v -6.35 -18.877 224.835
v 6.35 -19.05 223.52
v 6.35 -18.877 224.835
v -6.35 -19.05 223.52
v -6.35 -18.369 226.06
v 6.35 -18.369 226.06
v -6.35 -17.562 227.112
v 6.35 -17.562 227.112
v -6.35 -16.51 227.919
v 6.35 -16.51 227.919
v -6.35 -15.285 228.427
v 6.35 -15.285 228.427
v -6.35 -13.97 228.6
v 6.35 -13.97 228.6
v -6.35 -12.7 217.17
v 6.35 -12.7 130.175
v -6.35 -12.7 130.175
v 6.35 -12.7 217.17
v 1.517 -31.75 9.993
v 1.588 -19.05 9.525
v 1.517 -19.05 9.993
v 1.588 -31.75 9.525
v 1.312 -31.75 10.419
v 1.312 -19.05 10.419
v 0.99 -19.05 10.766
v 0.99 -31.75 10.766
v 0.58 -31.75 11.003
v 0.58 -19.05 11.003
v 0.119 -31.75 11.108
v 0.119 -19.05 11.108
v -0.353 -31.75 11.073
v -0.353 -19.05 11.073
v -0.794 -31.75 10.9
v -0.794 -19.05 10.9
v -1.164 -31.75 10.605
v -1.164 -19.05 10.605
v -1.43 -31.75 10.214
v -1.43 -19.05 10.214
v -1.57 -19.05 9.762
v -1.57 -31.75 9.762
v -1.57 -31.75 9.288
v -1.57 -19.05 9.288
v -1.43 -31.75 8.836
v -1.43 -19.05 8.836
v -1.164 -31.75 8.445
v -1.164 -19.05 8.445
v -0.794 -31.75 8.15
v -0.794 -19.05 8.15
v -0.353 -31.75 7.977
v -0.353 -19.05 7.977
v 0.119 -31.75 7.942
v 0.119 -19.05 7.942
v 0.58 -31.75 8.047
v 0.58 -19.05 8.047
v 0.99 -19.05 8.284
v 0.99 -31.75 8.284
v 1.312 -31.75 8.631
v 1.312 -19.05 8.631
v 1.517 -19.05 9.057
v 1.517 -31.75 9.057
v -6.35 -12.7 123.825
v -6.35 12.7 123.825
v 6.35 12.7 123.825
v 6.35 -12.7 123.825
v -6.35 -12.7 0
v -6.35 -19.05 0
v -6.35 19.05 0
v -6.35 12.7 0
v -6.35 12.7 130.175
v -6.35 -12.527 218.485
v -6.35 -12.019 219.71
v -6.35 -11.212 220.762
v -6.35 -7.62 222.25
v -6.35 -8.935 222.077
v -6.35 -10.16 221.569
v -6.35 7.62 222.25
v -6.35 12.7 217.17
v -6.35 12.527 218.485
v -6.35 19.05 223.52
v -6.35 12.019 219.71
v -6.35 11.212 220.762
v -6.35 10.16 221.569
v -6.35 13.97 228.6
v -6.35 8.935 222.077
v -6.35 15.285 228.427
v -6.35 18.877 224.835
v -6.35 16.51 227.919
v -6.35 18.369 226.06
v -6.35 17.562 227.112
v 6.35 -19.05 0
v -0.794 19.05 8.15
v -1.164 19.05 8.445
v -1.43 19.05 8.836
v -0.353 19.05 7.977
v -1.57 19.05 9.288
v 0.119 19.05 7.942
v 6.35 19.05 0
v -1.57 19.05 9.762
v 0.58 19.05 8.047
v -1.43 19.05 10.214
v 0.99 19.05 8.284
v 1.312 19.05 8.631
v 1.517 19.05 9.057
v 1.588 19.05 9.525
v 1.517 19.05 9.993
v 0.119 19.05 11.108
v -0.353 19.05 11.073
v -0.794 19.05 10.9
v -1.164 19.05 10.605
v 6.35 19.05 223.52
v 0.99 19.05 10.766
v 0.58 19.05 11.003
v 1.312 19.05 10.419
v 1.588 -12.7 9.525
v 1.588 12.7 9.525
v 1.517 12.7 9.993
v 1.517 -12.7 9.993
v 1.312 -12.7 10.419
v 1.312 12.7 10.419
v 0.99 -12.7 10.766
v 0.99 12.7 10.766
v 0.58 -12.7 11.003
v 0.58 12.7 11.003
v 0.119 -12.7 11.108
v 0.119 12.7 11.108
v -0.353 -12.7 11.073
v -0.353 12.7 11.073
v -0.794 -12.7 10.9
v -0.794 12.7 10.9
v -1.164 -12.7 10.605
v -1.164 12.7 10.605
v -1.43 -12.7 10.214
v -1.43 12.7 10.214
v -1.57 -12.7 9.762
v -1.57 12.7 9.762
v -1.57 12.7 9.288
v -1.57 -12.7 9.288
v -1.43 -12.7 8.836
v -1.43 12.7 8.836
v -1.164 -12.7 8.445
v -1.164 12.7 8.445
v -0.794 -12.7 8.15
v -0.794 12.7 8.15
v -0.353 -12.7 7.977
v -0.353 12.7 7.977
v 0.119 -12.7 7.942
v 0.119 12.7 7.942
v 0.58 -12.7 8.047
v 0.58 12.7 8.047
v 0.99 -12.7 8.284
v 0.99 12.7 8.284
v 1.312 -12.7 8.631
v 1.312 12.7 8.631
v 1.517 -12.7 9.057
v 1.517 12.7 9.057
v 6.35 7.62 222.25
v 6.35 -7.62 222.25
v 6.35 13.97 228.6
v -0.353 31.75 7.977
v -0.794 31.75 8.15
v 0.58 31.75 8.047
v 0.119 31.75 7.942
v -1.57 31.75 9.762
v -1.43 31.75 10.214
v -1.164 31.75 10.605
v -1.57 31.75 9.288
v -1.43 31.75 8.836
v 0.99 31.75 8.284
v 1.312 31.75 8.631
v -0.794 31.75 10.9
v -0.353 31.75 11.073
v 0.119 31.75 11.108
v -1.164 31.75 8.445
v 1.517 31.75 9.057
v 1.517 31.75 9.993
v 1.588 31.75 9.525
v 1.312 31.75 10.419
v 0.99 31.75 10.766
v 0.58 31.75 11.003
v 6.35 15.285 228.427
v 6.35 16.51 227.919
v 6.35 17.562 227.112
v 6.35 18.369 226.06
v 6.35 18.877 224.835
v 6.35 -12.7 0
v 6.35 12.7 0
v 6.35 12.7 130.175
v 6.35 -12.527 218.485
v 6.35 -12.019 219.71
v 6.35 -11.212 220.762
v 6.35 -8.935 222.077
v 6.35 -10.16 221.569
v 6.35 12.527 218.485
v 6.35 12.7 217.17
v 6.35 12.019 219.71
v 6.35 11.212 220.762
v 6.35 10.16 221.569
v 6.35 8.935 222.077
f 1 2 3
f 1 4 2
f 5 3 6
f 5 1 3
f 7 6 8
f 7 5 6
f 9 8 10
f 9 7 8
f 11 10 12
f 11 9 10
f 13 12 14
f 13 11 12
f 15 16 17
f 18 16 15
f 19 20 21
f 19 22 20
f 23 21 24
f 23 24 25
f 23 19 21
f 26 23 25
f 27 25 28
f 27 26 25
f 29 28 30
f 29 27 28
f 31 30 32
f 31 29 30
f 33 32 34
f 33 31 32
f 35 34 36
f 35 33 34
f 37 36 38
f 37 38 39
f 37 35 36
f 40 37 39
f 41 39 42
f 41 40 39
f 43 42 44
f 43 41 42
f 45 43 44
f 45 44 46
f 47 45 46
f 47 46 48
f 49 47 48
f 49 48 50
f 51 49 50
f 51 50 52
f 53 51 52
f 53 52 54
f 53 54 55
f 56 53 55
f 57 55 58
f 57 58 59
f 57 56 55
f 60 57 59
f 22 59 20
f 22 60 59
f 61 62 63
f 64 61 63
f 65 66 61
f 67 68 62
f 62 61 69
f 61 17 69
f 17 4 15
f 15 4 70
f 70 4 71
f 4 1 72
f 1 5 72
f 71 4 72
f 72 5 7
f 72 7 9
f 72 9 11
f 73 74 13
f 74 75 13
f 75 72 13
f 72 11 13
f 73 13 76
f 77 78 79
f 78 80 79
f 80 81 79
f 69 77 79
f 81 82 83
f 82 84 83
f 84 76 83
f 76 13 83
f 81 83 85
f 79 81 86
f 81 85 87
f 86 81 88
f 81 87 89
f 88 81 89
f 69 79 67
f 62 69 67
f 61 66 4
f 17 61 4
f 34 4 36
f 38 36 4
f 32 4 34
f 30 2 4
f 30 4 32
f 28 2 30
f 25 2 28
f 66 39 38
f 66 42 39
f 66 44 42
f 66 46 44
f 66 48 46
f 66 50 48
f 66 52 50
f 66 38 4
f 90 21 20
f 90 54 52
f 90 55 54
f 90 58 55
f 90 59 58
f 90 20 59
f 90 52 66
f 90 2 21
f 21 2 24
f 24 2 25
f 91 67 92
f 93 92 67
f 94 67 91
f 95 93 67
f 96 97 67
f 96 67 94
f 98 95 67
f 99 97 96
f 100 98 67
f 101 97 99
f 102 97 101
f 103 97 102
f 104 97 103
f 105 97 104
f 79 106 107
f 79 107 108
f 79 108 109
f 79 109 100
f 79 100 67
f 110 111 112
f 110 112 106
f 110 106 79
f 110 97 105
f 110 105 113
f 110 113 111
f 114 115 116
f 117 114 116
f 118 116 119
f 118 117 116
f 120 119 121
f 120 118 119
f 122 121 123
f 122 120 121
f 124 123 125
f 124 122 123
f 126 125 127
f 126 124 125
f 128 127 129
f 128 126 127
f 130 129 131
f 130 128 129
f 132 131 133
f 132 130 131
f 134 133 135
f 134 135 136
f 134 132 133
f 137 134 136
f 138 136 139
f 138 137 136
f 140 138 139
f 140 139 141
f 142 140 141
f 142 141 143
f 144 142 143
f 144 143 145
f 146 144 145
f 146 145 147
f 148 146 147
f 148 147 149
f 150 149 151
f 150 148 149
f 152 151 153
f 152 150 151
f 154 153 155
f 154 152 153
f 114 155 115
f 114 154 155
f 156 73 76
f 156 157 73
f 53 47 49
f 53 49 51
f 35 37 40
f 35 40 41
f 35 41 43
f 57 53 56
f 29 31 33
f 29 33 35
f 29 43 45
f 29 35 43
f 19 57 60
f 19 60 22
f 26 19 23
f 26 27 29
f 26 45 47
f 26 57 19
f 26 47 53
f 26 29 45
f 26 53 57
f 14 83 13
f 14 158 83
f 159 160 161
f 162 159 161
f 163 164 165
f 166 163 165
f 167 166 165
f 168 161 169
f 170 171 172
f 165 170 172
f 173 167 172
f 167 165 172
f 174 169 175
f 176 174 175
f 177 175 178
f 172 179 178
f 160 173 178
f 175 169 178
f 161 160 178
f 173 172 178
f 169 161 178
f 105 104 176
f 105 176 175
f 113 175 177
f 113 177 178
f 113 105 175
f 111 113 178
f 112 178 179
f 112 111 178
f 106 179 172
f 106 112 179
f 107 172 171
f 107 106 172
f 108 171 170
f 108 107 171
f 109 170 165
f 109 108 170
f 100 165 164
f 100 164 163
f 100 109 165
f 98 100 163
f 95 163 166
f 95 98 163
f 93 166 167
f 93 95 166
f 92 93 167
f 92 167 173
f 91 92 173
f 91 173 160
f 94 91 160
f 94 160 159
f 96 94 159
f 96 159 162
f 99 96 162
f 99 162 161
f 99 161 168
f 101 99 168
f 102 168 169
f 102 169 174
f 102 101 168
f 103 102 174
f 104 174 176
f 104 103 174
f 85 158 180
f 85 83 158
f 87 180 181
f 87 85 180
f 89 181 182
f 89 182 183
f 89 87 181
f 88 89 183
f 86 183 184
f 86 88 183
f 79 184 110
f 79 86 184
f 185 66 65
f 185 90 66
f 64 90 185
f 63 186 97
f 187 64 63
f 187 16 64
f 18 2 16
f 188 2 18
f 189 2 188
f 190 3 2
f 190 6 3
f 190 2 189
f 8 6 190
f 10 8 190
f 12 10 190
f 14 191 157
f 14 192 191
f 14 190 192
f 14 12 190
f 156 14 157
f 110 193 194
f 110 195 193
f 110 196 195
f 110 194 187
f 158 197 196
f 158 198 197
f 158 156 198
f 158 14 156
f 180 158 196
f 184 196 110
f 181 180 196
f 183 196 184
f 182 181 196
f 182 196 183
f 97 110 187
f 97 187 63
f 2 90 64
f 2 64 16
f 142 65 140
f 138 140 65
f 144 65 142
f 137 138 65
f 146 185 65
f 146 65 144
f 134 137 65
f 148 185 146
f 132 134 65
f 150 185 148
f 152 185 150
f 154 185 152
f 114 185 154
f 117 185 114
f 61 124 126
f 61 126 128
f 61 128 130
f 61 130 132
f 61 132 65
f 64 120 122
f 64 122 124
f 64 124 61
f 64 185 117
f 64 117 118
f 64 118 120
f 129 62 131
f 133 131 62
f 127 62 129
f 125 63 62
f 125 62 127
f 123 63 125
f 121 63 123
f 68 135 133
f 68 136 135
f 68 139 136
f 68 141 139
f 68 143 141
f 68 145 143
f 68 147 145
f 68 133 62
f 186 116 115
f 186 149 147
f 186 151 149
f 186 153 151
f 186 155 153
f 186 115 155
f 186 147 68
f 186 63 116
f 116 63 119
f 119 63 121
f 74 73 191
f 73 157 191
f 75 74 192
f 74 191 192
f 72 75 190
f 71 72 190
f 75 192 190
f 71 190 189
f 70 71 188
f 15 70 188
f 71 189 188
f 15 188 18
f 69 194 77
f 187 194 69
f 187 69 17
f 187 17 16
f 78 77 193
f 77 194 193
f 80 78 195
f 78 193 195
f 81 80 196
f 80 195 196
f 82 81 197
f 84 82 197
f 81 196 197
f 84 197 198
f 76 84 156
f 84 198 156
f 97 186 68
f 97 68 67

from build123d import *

# Parameters (mm, degrees)
F1_DEPTH = 6.35
F2_R     = 5.08
F3_W     = 12.7
F3_H     = 6.35
F4_DEPTH = 12.7
F3_R     = 1.5875
F5_DEPTH = 127
F6_DEPTH = 31.75


with BuildPart() as f1:
    # F0 (on Right) → F1 (new body, symmetric)
    with BuildSketch(Plane.YZ):
        Polygon((-19.05, 0), (-12.7, 0), (-12.7, 222.25), (12.7, 222.25), (12.7, 0), (19.05, 0), (19.05, 228.6), (12.7, 228.6), (-12.7, 228.6), (-19.05, 228.6), align=None)
    extrude(amount=F1_DEPTH, both=True)

    # F2
    f2_edges = [f1.edges().sort_by_distance(p)[0] for p in [
        (0, -12.7, 222.25),
        (0, 12.7, 222.25),
        (0, -19.05, 228.6),
        (0, 19.05, 228.6),
    ]]
    fillet(f2_edges, radius=F2_R)

    # F3 (on Front) → F4 (join, symmetric)
    with BuildSketch(Plane.XZ):
        with Locations((0, 127)):
            Rectangle(F3_W, F3_H)
    extrude(amount=F4_DEPTH, both=True)

    # F3 (on Front) → F5 (cut, symmetric)
    with BuildSketch(Plane.XZ):
        with Locations((0, 9.525)):
            Circle(F3_R)
    extrude(amount=F5_DEPTH, both=True, mode=Mode.SUBTRACT)

    # F3 (on Front) → F6 (join, symmetric)
    with BuildSketch(Plane.XZ):
        with Locations((0, 9.525)):
            Circle(F3_R)
    extrude(amount=F6_DEPTH, both=True)


solid = f1.part
